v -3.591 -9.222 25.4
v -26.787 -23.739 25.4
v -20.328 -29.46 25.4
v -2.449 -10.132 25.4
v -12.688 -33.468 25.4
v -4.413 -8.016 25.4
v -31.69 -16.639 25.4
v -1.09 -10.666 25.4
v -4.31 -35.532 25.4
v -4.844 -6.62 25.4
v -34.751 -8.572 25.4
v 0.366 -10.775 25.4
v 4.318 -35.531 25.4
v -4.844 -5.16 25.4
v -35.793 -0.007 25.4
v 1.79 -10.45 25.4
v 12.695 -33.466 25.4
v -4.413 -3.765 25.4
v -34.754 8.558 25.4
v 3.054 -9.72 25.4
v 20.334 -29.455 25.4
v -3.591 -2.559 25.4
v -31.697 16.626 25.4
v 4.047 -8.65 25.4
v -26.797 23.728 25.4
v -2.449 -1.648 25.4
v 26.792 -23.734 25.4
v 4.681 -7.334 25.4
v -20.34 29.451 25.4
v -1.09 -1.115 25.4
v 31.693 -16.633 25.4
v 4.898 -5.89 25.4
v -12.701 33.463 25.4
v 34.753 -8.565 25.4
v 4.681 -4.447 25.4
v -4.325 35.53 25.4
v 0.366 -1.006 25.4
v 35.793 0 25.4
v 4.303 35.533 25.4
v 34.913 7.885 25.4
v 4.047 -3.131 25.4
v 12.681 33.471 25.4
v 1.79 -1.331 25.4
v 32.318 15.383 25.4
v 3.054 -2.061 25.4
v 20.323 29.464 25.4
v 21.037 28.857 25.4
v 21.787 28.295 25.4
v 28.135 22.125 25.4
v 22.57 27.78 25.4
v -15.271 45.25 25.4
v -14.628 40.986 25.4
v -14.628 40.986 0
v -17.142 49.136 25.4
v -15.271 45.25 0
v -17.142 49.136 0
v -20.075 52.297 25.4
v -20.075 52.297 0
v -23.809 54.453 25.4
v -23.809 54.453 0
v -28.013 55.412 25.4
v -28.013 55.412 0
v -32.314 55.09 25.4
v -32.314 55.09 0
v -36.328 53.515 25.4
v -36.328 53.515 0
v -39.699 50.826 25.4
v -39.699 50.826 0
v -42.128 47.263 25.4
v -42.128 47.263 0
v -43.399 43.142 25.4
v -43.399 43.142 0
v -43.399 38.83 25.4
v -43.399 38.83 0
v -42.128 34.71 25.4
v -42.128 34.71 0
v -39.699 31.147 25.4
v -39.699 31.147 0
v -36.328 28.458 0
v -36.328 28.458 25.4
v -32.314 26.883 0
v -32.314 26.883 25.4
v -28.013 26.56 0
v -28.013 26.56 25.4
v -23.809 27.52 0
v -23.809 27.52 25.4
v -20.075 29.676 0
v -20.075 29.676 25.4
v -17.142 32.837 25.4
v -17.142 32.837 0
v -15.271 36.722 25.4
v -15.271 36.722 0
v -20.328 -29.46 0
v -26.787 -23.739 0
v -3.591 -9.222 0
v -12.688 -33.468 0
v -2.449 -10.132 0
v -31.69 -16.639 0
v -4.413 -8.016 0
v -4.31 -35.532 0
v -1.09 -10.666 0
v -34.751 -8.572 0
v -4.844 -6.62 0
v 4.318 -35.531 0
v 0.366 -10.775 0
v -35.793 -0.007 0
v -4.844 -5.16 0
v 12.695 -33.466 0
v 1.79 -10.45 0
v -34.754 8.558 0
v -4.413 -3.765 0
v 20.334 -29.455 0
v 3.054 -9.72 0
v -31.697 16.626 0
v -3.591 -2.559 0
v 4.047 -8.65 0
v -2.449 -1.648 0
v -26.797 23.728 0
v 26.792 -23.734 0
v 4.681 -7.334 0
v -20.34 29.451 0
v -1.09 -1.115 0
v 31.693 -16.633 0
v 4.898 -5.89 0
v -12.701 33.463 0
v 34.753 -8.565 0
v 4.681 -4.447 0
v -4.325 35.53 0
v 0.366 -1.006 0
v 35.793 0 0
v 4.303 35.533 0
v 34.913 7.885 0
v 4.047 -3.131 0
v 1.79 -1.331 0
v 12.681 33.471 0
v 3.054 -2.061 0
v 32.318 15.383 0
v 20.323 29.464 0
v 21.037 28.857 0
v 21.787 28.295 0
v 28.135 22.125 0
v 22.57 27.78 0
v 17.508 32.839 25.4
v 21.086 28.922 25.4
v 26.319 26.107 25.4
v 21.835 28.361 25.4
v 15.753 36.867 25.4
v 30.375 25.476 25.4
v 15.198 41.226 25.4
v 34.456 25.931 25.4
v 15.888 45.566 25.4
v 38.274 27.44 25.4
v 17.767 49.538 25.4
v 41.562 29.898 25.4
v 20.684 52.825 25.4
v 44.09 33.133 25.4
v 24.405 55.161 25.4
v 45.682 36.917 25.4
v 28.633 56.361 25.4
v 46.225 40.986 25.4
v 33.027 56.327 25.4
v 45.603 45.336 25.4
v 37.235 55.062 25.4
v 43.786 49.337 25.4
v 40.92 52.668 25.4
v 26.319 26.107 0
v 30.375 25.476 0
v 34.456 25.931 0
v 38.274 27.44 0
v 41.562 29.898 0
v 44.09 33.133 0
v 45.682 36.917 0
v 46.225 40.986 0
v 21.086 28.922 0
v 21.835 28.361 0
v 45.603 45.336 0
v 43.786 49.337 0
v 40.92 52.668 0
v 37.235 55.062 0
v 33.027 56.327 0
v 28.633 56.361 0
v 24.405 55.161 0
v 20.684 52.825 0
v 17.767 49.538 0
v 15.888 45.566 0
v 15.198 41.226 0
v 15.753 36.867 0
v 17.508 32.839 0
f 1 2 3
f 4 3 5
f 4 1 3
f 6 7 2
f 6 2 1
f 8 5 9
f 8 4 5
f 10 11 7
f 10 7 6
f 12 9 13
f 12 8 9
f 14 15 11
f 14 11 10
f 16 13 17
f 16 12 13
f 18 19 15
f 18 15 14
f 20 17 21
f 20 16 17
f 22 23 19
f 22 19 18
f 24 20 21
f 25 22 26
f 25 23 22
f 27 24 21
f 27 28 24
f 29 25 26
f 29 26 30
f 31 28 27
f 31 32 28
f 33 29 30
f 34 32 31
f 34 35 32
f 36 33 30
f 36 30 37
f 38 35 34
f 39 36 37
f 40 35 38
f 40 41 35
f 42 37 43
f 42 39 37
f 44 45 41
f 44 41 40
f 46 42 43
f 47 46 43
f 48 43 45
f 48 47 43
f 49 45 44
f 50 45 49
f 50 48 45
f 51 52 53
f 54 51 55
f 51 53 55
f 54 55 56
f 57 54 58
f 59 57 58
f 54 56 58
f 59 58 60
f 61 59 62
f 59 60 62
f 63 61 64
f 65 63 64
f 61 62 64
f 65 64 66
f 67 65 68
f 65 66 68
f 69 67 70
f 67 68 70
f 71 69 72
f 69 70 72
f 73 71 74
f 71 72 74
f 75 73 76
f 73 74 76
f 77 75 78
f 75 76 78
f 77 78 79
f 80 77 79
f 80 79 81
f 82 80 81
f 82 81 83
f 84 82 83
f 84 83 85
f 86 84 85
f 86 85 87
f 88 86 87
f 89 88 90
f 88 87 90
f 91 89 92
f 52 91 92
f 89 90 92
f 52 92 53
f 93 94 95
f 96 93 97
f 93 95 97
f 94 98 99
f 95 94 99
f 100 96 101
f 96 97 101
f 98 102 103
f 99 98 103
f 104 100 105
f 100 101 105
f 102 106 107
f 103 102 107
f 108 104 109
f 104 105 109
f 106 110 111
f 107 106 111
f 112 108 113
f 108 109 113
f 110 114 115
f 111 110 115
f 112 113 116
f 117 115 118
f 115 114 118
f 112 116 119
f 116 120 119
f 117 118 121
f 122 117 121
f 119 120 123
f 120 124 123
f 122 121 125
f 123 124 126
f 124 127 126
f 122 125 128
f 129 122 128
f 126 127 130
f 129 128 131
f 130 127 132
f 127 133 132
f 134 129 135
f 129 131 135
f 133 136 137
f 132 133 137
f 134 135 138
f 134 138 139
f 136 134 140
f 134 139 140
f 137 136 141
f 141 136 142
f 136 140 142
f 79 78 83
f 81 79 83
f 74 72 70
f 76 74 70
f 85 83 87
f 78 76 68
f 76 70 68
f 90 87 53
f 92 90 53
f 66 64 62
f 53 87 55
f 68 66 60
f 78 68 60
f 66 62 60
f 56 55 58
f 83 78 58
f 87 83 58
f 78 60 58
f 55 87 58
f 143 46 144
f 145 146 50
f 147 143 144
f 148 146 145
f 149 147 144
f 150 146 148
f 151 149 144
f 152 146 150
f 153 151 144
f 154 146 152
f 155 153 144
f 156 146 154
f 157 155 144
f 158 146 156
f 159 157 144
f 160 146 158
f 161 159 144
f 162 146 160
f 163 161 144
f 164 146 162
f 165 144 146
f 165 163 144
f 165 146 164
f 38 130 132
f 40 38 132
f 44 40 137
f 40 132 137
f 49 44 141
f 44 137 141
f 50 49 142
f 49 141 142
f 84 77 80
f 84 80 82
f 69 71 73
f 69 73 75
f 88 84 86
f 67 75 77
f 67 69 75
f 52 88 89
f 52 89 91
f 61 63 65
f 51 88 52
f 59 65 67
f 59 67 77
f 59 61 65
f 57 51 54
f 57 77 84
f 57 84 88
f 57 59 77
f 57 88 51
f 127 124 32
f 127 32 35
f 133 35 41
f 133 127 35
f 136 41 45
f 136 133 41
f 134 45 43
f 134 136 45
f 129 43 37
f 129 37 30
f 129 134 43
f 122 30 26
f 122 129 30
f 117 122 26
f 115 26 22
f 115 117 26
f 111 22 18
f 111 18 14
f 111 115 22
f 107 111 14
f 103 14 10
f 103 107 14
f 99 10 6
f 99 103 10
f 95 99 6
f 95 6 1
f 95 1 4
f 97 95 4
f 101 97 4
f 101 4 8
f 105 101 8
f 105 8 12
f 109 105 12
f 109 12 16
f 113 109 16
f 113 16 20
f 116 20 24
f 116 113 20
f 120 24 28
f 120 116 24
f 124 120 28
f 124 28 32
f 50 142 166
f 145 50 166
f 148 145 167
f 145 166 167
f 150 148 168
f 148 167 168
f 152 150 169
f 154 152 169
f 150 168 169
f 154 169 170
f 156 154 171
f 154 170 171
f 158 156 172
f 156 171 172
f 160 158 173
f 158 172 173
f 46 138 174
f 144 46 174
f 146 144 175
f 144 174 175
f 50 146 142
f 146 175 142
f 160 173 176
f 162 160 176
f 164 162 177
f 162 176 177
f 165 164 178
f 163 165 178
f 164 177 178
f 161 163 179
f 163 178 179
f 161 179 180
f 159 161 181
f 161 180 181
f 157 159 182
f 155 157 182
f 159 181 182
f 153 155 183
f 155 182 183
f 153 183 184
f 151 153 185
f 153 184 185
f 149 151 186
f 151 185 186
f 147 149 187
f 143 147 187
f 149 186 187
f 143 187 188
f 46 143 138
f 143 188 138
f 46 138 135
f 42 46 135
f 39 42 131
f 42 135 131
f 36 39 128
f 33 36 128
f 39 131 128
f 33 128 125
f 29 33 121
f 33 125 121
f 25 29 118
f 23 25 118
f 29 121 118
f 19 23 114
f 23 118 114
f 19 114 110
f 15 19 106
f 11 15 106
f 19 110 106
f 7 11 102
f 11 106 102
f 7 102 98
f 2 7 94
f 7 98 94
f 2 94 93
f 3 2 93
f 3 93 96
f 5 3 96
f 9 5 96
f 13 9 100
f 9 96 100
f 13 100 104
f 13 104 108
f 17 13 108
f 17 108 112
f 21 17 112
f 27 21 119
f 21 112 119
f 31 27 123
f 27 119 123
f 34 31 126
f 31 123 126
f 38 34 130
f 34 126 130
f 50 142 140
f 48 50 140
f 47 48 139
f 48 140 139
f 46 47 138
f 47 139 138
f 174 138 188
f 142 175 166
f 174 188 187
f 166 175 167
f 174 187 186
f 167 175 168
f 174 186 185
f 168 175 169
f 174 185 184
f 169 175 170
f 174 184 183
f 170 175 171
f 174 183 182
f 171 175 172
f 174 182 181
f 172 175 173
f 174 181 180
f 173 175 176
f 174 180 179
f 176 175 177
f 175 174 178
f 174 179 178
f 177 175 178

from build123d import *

# Parameters (mm, degrees)
F0_R     = 4.8983295198
F1_DEPTH = 25.4
F0_R_2   = 14.4664110347


# Not quite as in the source:
# - the program builds the solid bodies; features that only make, move or delete a surface that nothing else refers to are left out


with BuildPart() as f1:
    # F0 (on Top) → F1 (new body)
    with BuildSketch(Plane.XY):
        with BuildLine():
            ThreePointArc((20.3225355866, 29.4635993727), (-31.6899449587, -16.6390062557), (35.7925849956, 0))
            ThreePointArc((35.7925849956, 0), (32.3182399262, 15.3831241541), (22.5697060798, 27.7798039614))
            ThreePointArc((22.5697060798, 27.7798039614), (21.4079475638, 28.5707561401), (20.3225355866, 29.4635993727))
        make_face()
        with Locations((0, -5.8903987519)):
            Circle(F0_R, mode=Mode.SUBTRACT)
    extrude(amount=F1_DEPTH)


with BuildPart() as f1b:
    # F0 (on Top) → F1, piece 2 (new body)
    with BuildSketch(Plane.XY):
        with Locations((-29.0945470333, 40.9863628447)):
            Circle(F0_R_2)
    extrude(amount=F1_DEPTH)


with BuildPart() as f1c:
    # F0 (on Top) → F1, piece 3 (new body)
    with BuildSketch(Plane.XY):
        with BuildLine():
            ThreePointArc((20.3225355866, 29.4635993727), (21.4626394122, 28.6437471383), (22.5697060798, 27.7798039614))
            ThreePointArc((22.5697060798, 27.7798039614), (38.2735681299, 27.440197867), (46.2251736271, 40.9863628447))
            ThreePointArc((46.2251736271, 40.9863628447), (24.4051814016, 55.1613472846), (20.3225355866, 29.4635993727))
        make_face()
    extrude(amount=F1_DEPTH)


solid = Compound([f1.part, f1b.part, f1c.part])
